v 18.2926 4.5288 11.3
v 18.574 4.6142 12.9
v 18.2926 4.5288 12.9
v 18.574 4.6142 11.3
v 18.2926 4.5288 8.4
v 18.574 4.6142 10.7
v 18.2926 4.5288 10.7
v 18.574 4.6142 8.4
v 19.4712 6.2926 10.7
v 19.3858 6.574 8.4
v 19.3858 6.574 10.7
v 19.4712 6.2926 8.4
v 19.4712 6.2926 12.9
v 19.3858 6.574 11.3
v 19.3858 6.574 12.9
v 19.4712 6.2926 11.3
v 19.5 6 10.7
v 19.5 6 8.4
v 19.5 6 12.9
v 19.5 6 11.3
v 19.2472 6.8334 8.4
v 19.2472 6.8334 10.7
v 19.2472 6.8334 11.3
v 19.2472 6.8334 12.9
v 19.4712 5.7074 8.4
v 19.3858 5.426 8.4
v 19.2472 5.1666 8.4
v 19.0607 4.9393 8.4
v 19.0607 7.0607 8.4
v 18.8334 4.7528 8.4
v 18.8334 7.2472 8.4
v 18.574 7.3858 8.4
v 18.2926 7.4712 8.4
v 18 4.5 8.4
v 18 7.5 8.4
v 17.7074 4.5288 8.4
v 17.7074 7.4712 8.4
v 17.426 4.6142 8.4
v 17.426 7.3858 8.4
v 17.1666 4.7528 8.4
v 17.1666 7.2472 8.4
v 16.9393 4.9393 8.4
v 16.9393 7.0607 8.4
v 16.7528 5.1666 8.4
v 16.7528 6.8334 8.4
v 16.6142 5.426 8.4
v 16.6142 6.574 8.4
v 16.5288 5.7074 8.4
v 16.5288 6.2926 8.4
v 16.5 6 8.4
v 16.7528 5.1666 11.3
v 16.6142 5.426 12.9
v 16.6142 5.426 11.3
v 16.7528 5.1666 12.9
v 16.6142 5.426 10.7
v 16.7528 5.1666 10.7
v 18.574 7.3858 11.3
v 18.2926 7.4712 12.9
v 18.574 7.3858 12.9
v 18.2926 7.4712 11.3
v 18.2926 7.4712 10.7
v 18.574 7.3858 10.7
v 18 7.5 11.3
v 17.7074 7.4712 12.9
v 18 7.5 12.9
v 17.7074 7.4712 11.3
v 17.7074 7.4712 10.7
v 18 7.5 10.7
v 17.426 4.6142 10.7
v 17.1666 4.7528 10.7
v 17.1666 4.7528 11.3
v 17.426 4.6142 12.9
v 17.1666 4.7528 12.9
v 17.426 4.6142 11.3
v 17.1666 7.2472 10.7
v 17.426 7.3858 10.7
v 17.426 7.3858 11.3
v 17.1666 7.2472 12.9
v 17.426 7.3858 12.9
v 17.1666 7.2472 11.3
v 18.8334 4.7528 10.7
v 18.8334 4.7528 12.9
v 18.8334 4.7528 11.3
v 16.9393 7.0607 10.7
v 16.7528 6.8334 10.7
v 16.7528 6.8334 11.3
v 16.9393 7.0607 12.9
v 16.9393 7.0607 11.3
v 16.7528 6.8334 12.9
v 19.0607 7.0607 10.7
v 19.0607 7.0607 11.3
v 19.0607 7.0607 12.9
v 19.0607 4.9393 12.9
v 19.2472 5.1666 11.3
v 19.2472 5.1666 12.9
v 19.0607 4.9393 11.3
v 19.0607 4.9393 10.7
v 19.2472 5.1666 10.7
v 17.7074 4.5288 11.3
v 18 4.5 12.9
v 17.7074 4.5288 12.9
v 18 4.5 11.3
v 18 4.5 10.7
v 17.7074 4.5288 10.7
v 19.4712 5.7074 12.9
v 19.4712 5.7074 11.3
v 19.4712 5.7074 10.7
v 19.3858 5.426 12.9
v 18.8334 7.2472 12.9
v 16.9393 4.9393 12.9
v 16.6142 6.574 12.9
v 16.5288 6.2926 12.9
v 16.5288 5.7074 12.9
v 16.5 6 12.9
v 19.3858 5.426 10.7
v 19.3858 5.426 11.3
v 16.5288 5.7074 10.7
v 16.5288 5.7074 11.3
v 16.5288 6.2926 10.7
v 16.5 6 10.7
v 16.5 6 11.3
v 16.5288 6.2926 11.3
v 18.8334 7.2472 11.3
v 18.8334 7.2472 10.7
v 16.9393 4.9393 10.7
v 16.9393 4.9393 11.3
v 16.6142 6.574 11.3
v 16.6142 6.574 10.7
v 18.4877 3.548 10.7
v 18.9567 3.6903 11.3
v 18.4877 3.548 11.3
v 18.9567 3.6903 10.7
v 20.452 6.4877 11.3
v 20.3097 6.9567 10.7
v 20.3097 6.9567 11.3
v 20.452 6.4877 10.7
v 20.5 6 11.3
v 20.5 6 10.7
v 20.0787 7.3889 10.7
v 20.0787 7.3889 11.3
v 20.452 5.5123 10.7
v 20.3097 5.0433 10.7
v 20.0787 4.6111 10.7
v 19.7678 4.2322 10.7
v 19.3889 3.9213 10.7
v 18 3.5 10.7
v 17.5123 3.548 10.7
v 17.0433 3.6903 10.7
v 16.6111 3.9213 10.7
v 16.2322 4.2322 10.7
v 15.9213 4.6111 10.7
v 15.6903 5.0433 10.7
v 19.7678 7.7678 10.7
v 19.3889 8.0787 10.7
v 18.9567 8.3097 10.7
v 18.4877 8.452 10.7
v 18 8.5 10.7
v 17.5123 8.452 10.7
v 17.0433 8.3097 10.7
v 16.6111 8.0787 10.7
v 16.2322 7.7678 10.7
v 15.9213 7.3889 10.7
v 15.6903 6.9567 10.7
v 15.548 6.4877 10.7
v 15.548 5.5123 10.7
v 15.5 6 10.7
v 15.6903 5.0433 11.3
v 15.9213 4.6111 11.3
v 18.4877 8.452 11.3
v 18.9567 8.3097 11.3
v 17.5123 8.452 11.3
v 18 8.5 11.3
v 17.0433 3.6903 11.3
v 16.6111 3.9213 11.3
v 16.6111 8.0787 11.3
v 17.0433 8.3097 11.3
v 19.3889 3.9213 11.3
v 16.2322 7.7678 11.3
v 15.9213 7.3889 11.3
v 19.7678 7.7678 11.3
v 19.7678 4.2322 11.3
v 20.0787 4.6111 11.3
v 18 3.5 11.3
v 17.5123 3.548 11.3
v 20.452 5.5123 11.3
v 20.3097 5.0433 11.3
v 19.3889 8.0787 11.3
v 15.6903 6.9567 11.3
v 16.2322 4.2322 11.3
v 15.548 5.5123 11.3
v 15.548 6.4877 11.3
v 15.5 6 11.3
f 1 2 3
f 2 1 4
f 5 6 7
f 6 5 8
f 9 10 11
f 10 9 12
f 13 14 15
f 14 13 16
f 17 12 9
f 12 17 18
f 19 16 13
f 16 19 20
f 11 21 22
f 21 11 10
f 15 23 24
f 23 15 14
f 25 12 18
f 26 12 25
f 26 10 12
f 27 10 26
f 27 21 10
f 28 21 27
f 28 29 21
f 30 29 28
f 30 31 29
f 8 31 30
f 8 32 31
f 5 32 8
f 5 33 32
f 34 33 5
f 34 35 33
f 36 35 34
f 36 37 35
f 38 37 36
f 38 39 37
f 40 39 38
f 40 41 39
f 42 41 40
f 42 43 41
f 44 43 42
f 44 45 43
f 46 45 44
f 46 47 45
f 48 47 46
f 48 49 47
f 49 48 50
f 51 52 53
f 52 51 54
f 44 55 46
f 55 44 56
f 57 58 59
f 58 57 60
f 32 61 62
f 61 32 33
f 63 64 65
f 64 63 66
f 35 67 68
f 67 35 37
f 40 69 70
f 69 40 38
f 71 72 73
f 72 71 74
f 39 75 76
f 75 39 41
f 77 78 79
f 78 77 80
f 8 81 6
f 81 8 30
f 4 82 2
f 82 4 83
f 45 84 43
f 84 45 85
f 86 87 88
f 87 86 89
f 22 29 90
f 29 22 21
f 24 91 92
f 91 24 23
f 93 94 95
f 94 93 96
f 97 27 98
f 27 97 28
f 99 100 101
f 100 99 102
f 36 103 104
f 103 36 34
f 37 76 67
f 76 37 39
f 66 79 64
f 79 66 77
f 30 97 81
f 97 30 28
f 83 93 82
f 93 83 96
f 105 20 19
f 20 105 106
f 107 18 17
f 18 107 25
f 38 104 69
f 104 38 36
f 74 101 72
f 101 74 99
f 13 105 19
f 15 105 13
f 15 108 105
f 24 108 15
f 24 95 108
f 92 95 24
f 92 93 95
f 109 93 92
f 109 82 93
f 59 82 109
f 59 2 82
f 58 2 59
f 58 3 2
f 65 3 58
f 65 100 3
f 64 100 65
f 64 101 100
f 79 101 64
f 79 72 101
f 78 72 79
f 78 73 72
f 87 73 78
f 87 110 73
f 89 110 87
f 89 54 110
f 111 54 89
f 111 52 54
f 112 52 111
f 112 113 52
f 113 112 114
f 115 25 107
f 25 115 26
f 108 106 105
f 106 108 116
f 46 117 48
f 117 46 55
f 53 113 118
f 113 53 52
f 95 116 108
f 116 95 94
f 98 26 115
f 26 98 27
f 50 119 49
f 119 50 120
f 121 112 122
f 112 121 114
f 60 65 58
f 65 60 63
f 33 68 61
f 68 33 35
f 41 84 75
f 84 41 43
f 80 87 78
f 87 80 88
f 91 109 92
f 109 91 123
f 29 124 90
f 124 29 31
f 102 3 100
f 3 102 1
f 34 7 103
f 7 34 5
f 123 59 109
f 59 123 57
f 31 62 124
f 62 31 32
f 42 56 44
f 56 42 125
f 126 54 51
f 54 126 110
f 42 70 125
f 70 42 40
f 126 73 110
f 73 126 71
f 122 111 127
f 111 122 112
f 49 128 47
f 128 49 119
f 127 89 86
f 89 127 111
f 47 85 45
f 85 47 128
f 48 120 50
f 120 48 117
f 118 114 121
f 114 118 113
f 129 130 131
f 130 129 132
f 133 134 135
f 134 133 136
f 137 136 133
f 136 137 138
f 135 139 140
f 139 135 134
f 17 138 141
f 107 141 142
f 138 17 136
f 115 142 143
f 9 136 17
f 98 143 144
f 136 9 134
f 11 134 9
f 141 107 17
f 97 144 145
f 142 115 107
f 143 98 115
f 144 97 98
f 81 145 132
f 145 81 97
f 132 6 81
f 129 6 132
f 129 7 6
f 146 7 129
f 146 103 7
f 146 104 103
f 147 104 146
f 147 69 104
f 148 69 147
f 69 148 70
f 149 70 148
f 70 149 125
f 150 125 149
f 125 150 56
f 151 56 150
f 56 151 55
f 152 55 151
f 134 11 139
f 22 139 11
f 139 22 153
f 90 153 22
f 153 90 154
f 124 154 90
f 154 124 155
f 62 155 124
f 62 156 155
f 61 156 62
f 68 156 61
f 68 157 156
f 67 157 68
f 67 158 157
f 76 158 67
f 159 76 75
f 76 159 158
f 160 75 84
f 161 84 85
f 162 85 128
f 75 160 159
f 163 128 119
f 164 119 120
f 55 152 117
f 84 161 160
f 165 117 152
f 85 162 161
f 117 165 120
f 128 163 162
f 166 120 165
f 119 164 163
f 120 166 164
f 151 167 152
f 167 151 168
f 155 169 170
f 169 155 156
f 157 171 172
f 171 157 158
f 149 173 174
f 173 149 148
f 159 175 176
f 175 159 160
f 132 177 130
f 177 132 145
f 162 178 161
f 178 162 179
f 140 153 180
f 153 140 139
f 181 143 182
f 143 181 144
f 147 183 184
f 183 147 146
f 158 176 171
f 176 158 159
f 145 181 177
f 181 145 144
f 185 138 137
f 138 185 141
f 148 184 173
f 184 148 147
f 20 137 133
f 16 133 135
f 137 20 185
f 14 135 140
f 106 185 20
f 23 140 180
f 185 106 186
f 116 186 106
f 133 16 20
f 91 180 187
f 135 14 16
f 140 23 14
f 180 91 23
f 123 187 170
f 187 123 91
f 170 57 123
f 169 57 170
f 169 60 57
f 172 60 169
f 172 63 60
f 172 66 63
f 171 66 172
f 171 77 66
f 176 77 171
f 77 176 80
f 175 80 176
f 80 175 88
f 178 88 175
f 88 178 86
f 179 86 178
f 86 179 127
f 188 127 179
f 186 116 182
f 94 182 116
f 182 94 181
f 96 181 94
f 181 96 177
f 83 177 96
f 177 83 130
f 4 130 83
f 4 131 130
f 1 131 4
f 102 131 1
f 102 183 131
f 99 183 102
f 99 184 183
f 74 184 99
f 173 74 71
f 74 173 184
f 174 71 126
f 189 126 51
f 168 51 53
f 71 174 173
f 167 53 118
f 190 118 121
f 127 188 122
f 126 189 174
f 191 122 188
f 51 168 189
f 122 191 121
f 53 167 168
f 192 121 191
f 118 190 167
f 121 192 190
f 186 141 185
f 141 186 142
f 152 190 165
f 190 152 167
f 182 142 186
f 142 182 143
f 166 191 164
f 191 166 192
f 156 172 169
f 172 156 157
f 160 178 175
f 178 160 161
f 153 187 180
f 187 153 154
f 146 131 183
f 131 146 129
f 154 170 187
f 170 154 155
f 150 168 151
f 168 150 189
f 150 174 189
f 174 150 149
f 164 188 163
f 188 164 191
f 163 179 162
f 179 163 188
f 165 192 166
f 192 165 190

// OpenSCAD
// The pipe D1 of the housing "usbc_parts", written by enclosure-nv 0.1.0
// from the board file usbc_board.kicad_pcb.  Render with OpenSCAD.
// Parameters, in millimetres.  The same block heads every file of this housing:
// when a value is changed, change it in each file.
wall = 2.4;
floor_t = 2.4;
lid_t = 1.6;
clear = 0.5;  // the board's edge to the inside of the wall
standoff_d = 6;
screw_d = 2.5;
pilot_d = 2.1;
head_d = 5;
head_h = 1.6;
lip_h = 3;  // the height of the step the lid sits on
lid_gap = 0.2;
snap_depth = 0.4;
snap_h = 0.8;
led_d = 3;
button_d = 3;
board_t = 1.6;
standoff_h = 3;  // the space under the board
top_space = 4.3;  // the space above the board
pilot_len = 3.5;  // the depth of the screw's hole
print_flip = false;  // true lays the lid plate down

// Levels along z.
z_bb = floor_t + standoff_h;
z_bt = z_bb + board_t;
z_split = z_bt + top_space;
z_step = z_split - lip_h;
z_top = z_split + lid_t;
z_skirt = z_step + lid_gap;
a_in = wall / 2;
screw_clear = screw_d + 0.3;

module pipe_D1() {
  union() {
    translate([18, 6, z_bt + (1.4)]) cylinder(h = z_top - (z_bt + (1.4)), d = led_d, $fn = 32);
    translate([18, 6, z_split - 0.6]) cylinder(h = 0.6, d = led_d + 2, $fn = 32);
  }
}

pipe_D1();
